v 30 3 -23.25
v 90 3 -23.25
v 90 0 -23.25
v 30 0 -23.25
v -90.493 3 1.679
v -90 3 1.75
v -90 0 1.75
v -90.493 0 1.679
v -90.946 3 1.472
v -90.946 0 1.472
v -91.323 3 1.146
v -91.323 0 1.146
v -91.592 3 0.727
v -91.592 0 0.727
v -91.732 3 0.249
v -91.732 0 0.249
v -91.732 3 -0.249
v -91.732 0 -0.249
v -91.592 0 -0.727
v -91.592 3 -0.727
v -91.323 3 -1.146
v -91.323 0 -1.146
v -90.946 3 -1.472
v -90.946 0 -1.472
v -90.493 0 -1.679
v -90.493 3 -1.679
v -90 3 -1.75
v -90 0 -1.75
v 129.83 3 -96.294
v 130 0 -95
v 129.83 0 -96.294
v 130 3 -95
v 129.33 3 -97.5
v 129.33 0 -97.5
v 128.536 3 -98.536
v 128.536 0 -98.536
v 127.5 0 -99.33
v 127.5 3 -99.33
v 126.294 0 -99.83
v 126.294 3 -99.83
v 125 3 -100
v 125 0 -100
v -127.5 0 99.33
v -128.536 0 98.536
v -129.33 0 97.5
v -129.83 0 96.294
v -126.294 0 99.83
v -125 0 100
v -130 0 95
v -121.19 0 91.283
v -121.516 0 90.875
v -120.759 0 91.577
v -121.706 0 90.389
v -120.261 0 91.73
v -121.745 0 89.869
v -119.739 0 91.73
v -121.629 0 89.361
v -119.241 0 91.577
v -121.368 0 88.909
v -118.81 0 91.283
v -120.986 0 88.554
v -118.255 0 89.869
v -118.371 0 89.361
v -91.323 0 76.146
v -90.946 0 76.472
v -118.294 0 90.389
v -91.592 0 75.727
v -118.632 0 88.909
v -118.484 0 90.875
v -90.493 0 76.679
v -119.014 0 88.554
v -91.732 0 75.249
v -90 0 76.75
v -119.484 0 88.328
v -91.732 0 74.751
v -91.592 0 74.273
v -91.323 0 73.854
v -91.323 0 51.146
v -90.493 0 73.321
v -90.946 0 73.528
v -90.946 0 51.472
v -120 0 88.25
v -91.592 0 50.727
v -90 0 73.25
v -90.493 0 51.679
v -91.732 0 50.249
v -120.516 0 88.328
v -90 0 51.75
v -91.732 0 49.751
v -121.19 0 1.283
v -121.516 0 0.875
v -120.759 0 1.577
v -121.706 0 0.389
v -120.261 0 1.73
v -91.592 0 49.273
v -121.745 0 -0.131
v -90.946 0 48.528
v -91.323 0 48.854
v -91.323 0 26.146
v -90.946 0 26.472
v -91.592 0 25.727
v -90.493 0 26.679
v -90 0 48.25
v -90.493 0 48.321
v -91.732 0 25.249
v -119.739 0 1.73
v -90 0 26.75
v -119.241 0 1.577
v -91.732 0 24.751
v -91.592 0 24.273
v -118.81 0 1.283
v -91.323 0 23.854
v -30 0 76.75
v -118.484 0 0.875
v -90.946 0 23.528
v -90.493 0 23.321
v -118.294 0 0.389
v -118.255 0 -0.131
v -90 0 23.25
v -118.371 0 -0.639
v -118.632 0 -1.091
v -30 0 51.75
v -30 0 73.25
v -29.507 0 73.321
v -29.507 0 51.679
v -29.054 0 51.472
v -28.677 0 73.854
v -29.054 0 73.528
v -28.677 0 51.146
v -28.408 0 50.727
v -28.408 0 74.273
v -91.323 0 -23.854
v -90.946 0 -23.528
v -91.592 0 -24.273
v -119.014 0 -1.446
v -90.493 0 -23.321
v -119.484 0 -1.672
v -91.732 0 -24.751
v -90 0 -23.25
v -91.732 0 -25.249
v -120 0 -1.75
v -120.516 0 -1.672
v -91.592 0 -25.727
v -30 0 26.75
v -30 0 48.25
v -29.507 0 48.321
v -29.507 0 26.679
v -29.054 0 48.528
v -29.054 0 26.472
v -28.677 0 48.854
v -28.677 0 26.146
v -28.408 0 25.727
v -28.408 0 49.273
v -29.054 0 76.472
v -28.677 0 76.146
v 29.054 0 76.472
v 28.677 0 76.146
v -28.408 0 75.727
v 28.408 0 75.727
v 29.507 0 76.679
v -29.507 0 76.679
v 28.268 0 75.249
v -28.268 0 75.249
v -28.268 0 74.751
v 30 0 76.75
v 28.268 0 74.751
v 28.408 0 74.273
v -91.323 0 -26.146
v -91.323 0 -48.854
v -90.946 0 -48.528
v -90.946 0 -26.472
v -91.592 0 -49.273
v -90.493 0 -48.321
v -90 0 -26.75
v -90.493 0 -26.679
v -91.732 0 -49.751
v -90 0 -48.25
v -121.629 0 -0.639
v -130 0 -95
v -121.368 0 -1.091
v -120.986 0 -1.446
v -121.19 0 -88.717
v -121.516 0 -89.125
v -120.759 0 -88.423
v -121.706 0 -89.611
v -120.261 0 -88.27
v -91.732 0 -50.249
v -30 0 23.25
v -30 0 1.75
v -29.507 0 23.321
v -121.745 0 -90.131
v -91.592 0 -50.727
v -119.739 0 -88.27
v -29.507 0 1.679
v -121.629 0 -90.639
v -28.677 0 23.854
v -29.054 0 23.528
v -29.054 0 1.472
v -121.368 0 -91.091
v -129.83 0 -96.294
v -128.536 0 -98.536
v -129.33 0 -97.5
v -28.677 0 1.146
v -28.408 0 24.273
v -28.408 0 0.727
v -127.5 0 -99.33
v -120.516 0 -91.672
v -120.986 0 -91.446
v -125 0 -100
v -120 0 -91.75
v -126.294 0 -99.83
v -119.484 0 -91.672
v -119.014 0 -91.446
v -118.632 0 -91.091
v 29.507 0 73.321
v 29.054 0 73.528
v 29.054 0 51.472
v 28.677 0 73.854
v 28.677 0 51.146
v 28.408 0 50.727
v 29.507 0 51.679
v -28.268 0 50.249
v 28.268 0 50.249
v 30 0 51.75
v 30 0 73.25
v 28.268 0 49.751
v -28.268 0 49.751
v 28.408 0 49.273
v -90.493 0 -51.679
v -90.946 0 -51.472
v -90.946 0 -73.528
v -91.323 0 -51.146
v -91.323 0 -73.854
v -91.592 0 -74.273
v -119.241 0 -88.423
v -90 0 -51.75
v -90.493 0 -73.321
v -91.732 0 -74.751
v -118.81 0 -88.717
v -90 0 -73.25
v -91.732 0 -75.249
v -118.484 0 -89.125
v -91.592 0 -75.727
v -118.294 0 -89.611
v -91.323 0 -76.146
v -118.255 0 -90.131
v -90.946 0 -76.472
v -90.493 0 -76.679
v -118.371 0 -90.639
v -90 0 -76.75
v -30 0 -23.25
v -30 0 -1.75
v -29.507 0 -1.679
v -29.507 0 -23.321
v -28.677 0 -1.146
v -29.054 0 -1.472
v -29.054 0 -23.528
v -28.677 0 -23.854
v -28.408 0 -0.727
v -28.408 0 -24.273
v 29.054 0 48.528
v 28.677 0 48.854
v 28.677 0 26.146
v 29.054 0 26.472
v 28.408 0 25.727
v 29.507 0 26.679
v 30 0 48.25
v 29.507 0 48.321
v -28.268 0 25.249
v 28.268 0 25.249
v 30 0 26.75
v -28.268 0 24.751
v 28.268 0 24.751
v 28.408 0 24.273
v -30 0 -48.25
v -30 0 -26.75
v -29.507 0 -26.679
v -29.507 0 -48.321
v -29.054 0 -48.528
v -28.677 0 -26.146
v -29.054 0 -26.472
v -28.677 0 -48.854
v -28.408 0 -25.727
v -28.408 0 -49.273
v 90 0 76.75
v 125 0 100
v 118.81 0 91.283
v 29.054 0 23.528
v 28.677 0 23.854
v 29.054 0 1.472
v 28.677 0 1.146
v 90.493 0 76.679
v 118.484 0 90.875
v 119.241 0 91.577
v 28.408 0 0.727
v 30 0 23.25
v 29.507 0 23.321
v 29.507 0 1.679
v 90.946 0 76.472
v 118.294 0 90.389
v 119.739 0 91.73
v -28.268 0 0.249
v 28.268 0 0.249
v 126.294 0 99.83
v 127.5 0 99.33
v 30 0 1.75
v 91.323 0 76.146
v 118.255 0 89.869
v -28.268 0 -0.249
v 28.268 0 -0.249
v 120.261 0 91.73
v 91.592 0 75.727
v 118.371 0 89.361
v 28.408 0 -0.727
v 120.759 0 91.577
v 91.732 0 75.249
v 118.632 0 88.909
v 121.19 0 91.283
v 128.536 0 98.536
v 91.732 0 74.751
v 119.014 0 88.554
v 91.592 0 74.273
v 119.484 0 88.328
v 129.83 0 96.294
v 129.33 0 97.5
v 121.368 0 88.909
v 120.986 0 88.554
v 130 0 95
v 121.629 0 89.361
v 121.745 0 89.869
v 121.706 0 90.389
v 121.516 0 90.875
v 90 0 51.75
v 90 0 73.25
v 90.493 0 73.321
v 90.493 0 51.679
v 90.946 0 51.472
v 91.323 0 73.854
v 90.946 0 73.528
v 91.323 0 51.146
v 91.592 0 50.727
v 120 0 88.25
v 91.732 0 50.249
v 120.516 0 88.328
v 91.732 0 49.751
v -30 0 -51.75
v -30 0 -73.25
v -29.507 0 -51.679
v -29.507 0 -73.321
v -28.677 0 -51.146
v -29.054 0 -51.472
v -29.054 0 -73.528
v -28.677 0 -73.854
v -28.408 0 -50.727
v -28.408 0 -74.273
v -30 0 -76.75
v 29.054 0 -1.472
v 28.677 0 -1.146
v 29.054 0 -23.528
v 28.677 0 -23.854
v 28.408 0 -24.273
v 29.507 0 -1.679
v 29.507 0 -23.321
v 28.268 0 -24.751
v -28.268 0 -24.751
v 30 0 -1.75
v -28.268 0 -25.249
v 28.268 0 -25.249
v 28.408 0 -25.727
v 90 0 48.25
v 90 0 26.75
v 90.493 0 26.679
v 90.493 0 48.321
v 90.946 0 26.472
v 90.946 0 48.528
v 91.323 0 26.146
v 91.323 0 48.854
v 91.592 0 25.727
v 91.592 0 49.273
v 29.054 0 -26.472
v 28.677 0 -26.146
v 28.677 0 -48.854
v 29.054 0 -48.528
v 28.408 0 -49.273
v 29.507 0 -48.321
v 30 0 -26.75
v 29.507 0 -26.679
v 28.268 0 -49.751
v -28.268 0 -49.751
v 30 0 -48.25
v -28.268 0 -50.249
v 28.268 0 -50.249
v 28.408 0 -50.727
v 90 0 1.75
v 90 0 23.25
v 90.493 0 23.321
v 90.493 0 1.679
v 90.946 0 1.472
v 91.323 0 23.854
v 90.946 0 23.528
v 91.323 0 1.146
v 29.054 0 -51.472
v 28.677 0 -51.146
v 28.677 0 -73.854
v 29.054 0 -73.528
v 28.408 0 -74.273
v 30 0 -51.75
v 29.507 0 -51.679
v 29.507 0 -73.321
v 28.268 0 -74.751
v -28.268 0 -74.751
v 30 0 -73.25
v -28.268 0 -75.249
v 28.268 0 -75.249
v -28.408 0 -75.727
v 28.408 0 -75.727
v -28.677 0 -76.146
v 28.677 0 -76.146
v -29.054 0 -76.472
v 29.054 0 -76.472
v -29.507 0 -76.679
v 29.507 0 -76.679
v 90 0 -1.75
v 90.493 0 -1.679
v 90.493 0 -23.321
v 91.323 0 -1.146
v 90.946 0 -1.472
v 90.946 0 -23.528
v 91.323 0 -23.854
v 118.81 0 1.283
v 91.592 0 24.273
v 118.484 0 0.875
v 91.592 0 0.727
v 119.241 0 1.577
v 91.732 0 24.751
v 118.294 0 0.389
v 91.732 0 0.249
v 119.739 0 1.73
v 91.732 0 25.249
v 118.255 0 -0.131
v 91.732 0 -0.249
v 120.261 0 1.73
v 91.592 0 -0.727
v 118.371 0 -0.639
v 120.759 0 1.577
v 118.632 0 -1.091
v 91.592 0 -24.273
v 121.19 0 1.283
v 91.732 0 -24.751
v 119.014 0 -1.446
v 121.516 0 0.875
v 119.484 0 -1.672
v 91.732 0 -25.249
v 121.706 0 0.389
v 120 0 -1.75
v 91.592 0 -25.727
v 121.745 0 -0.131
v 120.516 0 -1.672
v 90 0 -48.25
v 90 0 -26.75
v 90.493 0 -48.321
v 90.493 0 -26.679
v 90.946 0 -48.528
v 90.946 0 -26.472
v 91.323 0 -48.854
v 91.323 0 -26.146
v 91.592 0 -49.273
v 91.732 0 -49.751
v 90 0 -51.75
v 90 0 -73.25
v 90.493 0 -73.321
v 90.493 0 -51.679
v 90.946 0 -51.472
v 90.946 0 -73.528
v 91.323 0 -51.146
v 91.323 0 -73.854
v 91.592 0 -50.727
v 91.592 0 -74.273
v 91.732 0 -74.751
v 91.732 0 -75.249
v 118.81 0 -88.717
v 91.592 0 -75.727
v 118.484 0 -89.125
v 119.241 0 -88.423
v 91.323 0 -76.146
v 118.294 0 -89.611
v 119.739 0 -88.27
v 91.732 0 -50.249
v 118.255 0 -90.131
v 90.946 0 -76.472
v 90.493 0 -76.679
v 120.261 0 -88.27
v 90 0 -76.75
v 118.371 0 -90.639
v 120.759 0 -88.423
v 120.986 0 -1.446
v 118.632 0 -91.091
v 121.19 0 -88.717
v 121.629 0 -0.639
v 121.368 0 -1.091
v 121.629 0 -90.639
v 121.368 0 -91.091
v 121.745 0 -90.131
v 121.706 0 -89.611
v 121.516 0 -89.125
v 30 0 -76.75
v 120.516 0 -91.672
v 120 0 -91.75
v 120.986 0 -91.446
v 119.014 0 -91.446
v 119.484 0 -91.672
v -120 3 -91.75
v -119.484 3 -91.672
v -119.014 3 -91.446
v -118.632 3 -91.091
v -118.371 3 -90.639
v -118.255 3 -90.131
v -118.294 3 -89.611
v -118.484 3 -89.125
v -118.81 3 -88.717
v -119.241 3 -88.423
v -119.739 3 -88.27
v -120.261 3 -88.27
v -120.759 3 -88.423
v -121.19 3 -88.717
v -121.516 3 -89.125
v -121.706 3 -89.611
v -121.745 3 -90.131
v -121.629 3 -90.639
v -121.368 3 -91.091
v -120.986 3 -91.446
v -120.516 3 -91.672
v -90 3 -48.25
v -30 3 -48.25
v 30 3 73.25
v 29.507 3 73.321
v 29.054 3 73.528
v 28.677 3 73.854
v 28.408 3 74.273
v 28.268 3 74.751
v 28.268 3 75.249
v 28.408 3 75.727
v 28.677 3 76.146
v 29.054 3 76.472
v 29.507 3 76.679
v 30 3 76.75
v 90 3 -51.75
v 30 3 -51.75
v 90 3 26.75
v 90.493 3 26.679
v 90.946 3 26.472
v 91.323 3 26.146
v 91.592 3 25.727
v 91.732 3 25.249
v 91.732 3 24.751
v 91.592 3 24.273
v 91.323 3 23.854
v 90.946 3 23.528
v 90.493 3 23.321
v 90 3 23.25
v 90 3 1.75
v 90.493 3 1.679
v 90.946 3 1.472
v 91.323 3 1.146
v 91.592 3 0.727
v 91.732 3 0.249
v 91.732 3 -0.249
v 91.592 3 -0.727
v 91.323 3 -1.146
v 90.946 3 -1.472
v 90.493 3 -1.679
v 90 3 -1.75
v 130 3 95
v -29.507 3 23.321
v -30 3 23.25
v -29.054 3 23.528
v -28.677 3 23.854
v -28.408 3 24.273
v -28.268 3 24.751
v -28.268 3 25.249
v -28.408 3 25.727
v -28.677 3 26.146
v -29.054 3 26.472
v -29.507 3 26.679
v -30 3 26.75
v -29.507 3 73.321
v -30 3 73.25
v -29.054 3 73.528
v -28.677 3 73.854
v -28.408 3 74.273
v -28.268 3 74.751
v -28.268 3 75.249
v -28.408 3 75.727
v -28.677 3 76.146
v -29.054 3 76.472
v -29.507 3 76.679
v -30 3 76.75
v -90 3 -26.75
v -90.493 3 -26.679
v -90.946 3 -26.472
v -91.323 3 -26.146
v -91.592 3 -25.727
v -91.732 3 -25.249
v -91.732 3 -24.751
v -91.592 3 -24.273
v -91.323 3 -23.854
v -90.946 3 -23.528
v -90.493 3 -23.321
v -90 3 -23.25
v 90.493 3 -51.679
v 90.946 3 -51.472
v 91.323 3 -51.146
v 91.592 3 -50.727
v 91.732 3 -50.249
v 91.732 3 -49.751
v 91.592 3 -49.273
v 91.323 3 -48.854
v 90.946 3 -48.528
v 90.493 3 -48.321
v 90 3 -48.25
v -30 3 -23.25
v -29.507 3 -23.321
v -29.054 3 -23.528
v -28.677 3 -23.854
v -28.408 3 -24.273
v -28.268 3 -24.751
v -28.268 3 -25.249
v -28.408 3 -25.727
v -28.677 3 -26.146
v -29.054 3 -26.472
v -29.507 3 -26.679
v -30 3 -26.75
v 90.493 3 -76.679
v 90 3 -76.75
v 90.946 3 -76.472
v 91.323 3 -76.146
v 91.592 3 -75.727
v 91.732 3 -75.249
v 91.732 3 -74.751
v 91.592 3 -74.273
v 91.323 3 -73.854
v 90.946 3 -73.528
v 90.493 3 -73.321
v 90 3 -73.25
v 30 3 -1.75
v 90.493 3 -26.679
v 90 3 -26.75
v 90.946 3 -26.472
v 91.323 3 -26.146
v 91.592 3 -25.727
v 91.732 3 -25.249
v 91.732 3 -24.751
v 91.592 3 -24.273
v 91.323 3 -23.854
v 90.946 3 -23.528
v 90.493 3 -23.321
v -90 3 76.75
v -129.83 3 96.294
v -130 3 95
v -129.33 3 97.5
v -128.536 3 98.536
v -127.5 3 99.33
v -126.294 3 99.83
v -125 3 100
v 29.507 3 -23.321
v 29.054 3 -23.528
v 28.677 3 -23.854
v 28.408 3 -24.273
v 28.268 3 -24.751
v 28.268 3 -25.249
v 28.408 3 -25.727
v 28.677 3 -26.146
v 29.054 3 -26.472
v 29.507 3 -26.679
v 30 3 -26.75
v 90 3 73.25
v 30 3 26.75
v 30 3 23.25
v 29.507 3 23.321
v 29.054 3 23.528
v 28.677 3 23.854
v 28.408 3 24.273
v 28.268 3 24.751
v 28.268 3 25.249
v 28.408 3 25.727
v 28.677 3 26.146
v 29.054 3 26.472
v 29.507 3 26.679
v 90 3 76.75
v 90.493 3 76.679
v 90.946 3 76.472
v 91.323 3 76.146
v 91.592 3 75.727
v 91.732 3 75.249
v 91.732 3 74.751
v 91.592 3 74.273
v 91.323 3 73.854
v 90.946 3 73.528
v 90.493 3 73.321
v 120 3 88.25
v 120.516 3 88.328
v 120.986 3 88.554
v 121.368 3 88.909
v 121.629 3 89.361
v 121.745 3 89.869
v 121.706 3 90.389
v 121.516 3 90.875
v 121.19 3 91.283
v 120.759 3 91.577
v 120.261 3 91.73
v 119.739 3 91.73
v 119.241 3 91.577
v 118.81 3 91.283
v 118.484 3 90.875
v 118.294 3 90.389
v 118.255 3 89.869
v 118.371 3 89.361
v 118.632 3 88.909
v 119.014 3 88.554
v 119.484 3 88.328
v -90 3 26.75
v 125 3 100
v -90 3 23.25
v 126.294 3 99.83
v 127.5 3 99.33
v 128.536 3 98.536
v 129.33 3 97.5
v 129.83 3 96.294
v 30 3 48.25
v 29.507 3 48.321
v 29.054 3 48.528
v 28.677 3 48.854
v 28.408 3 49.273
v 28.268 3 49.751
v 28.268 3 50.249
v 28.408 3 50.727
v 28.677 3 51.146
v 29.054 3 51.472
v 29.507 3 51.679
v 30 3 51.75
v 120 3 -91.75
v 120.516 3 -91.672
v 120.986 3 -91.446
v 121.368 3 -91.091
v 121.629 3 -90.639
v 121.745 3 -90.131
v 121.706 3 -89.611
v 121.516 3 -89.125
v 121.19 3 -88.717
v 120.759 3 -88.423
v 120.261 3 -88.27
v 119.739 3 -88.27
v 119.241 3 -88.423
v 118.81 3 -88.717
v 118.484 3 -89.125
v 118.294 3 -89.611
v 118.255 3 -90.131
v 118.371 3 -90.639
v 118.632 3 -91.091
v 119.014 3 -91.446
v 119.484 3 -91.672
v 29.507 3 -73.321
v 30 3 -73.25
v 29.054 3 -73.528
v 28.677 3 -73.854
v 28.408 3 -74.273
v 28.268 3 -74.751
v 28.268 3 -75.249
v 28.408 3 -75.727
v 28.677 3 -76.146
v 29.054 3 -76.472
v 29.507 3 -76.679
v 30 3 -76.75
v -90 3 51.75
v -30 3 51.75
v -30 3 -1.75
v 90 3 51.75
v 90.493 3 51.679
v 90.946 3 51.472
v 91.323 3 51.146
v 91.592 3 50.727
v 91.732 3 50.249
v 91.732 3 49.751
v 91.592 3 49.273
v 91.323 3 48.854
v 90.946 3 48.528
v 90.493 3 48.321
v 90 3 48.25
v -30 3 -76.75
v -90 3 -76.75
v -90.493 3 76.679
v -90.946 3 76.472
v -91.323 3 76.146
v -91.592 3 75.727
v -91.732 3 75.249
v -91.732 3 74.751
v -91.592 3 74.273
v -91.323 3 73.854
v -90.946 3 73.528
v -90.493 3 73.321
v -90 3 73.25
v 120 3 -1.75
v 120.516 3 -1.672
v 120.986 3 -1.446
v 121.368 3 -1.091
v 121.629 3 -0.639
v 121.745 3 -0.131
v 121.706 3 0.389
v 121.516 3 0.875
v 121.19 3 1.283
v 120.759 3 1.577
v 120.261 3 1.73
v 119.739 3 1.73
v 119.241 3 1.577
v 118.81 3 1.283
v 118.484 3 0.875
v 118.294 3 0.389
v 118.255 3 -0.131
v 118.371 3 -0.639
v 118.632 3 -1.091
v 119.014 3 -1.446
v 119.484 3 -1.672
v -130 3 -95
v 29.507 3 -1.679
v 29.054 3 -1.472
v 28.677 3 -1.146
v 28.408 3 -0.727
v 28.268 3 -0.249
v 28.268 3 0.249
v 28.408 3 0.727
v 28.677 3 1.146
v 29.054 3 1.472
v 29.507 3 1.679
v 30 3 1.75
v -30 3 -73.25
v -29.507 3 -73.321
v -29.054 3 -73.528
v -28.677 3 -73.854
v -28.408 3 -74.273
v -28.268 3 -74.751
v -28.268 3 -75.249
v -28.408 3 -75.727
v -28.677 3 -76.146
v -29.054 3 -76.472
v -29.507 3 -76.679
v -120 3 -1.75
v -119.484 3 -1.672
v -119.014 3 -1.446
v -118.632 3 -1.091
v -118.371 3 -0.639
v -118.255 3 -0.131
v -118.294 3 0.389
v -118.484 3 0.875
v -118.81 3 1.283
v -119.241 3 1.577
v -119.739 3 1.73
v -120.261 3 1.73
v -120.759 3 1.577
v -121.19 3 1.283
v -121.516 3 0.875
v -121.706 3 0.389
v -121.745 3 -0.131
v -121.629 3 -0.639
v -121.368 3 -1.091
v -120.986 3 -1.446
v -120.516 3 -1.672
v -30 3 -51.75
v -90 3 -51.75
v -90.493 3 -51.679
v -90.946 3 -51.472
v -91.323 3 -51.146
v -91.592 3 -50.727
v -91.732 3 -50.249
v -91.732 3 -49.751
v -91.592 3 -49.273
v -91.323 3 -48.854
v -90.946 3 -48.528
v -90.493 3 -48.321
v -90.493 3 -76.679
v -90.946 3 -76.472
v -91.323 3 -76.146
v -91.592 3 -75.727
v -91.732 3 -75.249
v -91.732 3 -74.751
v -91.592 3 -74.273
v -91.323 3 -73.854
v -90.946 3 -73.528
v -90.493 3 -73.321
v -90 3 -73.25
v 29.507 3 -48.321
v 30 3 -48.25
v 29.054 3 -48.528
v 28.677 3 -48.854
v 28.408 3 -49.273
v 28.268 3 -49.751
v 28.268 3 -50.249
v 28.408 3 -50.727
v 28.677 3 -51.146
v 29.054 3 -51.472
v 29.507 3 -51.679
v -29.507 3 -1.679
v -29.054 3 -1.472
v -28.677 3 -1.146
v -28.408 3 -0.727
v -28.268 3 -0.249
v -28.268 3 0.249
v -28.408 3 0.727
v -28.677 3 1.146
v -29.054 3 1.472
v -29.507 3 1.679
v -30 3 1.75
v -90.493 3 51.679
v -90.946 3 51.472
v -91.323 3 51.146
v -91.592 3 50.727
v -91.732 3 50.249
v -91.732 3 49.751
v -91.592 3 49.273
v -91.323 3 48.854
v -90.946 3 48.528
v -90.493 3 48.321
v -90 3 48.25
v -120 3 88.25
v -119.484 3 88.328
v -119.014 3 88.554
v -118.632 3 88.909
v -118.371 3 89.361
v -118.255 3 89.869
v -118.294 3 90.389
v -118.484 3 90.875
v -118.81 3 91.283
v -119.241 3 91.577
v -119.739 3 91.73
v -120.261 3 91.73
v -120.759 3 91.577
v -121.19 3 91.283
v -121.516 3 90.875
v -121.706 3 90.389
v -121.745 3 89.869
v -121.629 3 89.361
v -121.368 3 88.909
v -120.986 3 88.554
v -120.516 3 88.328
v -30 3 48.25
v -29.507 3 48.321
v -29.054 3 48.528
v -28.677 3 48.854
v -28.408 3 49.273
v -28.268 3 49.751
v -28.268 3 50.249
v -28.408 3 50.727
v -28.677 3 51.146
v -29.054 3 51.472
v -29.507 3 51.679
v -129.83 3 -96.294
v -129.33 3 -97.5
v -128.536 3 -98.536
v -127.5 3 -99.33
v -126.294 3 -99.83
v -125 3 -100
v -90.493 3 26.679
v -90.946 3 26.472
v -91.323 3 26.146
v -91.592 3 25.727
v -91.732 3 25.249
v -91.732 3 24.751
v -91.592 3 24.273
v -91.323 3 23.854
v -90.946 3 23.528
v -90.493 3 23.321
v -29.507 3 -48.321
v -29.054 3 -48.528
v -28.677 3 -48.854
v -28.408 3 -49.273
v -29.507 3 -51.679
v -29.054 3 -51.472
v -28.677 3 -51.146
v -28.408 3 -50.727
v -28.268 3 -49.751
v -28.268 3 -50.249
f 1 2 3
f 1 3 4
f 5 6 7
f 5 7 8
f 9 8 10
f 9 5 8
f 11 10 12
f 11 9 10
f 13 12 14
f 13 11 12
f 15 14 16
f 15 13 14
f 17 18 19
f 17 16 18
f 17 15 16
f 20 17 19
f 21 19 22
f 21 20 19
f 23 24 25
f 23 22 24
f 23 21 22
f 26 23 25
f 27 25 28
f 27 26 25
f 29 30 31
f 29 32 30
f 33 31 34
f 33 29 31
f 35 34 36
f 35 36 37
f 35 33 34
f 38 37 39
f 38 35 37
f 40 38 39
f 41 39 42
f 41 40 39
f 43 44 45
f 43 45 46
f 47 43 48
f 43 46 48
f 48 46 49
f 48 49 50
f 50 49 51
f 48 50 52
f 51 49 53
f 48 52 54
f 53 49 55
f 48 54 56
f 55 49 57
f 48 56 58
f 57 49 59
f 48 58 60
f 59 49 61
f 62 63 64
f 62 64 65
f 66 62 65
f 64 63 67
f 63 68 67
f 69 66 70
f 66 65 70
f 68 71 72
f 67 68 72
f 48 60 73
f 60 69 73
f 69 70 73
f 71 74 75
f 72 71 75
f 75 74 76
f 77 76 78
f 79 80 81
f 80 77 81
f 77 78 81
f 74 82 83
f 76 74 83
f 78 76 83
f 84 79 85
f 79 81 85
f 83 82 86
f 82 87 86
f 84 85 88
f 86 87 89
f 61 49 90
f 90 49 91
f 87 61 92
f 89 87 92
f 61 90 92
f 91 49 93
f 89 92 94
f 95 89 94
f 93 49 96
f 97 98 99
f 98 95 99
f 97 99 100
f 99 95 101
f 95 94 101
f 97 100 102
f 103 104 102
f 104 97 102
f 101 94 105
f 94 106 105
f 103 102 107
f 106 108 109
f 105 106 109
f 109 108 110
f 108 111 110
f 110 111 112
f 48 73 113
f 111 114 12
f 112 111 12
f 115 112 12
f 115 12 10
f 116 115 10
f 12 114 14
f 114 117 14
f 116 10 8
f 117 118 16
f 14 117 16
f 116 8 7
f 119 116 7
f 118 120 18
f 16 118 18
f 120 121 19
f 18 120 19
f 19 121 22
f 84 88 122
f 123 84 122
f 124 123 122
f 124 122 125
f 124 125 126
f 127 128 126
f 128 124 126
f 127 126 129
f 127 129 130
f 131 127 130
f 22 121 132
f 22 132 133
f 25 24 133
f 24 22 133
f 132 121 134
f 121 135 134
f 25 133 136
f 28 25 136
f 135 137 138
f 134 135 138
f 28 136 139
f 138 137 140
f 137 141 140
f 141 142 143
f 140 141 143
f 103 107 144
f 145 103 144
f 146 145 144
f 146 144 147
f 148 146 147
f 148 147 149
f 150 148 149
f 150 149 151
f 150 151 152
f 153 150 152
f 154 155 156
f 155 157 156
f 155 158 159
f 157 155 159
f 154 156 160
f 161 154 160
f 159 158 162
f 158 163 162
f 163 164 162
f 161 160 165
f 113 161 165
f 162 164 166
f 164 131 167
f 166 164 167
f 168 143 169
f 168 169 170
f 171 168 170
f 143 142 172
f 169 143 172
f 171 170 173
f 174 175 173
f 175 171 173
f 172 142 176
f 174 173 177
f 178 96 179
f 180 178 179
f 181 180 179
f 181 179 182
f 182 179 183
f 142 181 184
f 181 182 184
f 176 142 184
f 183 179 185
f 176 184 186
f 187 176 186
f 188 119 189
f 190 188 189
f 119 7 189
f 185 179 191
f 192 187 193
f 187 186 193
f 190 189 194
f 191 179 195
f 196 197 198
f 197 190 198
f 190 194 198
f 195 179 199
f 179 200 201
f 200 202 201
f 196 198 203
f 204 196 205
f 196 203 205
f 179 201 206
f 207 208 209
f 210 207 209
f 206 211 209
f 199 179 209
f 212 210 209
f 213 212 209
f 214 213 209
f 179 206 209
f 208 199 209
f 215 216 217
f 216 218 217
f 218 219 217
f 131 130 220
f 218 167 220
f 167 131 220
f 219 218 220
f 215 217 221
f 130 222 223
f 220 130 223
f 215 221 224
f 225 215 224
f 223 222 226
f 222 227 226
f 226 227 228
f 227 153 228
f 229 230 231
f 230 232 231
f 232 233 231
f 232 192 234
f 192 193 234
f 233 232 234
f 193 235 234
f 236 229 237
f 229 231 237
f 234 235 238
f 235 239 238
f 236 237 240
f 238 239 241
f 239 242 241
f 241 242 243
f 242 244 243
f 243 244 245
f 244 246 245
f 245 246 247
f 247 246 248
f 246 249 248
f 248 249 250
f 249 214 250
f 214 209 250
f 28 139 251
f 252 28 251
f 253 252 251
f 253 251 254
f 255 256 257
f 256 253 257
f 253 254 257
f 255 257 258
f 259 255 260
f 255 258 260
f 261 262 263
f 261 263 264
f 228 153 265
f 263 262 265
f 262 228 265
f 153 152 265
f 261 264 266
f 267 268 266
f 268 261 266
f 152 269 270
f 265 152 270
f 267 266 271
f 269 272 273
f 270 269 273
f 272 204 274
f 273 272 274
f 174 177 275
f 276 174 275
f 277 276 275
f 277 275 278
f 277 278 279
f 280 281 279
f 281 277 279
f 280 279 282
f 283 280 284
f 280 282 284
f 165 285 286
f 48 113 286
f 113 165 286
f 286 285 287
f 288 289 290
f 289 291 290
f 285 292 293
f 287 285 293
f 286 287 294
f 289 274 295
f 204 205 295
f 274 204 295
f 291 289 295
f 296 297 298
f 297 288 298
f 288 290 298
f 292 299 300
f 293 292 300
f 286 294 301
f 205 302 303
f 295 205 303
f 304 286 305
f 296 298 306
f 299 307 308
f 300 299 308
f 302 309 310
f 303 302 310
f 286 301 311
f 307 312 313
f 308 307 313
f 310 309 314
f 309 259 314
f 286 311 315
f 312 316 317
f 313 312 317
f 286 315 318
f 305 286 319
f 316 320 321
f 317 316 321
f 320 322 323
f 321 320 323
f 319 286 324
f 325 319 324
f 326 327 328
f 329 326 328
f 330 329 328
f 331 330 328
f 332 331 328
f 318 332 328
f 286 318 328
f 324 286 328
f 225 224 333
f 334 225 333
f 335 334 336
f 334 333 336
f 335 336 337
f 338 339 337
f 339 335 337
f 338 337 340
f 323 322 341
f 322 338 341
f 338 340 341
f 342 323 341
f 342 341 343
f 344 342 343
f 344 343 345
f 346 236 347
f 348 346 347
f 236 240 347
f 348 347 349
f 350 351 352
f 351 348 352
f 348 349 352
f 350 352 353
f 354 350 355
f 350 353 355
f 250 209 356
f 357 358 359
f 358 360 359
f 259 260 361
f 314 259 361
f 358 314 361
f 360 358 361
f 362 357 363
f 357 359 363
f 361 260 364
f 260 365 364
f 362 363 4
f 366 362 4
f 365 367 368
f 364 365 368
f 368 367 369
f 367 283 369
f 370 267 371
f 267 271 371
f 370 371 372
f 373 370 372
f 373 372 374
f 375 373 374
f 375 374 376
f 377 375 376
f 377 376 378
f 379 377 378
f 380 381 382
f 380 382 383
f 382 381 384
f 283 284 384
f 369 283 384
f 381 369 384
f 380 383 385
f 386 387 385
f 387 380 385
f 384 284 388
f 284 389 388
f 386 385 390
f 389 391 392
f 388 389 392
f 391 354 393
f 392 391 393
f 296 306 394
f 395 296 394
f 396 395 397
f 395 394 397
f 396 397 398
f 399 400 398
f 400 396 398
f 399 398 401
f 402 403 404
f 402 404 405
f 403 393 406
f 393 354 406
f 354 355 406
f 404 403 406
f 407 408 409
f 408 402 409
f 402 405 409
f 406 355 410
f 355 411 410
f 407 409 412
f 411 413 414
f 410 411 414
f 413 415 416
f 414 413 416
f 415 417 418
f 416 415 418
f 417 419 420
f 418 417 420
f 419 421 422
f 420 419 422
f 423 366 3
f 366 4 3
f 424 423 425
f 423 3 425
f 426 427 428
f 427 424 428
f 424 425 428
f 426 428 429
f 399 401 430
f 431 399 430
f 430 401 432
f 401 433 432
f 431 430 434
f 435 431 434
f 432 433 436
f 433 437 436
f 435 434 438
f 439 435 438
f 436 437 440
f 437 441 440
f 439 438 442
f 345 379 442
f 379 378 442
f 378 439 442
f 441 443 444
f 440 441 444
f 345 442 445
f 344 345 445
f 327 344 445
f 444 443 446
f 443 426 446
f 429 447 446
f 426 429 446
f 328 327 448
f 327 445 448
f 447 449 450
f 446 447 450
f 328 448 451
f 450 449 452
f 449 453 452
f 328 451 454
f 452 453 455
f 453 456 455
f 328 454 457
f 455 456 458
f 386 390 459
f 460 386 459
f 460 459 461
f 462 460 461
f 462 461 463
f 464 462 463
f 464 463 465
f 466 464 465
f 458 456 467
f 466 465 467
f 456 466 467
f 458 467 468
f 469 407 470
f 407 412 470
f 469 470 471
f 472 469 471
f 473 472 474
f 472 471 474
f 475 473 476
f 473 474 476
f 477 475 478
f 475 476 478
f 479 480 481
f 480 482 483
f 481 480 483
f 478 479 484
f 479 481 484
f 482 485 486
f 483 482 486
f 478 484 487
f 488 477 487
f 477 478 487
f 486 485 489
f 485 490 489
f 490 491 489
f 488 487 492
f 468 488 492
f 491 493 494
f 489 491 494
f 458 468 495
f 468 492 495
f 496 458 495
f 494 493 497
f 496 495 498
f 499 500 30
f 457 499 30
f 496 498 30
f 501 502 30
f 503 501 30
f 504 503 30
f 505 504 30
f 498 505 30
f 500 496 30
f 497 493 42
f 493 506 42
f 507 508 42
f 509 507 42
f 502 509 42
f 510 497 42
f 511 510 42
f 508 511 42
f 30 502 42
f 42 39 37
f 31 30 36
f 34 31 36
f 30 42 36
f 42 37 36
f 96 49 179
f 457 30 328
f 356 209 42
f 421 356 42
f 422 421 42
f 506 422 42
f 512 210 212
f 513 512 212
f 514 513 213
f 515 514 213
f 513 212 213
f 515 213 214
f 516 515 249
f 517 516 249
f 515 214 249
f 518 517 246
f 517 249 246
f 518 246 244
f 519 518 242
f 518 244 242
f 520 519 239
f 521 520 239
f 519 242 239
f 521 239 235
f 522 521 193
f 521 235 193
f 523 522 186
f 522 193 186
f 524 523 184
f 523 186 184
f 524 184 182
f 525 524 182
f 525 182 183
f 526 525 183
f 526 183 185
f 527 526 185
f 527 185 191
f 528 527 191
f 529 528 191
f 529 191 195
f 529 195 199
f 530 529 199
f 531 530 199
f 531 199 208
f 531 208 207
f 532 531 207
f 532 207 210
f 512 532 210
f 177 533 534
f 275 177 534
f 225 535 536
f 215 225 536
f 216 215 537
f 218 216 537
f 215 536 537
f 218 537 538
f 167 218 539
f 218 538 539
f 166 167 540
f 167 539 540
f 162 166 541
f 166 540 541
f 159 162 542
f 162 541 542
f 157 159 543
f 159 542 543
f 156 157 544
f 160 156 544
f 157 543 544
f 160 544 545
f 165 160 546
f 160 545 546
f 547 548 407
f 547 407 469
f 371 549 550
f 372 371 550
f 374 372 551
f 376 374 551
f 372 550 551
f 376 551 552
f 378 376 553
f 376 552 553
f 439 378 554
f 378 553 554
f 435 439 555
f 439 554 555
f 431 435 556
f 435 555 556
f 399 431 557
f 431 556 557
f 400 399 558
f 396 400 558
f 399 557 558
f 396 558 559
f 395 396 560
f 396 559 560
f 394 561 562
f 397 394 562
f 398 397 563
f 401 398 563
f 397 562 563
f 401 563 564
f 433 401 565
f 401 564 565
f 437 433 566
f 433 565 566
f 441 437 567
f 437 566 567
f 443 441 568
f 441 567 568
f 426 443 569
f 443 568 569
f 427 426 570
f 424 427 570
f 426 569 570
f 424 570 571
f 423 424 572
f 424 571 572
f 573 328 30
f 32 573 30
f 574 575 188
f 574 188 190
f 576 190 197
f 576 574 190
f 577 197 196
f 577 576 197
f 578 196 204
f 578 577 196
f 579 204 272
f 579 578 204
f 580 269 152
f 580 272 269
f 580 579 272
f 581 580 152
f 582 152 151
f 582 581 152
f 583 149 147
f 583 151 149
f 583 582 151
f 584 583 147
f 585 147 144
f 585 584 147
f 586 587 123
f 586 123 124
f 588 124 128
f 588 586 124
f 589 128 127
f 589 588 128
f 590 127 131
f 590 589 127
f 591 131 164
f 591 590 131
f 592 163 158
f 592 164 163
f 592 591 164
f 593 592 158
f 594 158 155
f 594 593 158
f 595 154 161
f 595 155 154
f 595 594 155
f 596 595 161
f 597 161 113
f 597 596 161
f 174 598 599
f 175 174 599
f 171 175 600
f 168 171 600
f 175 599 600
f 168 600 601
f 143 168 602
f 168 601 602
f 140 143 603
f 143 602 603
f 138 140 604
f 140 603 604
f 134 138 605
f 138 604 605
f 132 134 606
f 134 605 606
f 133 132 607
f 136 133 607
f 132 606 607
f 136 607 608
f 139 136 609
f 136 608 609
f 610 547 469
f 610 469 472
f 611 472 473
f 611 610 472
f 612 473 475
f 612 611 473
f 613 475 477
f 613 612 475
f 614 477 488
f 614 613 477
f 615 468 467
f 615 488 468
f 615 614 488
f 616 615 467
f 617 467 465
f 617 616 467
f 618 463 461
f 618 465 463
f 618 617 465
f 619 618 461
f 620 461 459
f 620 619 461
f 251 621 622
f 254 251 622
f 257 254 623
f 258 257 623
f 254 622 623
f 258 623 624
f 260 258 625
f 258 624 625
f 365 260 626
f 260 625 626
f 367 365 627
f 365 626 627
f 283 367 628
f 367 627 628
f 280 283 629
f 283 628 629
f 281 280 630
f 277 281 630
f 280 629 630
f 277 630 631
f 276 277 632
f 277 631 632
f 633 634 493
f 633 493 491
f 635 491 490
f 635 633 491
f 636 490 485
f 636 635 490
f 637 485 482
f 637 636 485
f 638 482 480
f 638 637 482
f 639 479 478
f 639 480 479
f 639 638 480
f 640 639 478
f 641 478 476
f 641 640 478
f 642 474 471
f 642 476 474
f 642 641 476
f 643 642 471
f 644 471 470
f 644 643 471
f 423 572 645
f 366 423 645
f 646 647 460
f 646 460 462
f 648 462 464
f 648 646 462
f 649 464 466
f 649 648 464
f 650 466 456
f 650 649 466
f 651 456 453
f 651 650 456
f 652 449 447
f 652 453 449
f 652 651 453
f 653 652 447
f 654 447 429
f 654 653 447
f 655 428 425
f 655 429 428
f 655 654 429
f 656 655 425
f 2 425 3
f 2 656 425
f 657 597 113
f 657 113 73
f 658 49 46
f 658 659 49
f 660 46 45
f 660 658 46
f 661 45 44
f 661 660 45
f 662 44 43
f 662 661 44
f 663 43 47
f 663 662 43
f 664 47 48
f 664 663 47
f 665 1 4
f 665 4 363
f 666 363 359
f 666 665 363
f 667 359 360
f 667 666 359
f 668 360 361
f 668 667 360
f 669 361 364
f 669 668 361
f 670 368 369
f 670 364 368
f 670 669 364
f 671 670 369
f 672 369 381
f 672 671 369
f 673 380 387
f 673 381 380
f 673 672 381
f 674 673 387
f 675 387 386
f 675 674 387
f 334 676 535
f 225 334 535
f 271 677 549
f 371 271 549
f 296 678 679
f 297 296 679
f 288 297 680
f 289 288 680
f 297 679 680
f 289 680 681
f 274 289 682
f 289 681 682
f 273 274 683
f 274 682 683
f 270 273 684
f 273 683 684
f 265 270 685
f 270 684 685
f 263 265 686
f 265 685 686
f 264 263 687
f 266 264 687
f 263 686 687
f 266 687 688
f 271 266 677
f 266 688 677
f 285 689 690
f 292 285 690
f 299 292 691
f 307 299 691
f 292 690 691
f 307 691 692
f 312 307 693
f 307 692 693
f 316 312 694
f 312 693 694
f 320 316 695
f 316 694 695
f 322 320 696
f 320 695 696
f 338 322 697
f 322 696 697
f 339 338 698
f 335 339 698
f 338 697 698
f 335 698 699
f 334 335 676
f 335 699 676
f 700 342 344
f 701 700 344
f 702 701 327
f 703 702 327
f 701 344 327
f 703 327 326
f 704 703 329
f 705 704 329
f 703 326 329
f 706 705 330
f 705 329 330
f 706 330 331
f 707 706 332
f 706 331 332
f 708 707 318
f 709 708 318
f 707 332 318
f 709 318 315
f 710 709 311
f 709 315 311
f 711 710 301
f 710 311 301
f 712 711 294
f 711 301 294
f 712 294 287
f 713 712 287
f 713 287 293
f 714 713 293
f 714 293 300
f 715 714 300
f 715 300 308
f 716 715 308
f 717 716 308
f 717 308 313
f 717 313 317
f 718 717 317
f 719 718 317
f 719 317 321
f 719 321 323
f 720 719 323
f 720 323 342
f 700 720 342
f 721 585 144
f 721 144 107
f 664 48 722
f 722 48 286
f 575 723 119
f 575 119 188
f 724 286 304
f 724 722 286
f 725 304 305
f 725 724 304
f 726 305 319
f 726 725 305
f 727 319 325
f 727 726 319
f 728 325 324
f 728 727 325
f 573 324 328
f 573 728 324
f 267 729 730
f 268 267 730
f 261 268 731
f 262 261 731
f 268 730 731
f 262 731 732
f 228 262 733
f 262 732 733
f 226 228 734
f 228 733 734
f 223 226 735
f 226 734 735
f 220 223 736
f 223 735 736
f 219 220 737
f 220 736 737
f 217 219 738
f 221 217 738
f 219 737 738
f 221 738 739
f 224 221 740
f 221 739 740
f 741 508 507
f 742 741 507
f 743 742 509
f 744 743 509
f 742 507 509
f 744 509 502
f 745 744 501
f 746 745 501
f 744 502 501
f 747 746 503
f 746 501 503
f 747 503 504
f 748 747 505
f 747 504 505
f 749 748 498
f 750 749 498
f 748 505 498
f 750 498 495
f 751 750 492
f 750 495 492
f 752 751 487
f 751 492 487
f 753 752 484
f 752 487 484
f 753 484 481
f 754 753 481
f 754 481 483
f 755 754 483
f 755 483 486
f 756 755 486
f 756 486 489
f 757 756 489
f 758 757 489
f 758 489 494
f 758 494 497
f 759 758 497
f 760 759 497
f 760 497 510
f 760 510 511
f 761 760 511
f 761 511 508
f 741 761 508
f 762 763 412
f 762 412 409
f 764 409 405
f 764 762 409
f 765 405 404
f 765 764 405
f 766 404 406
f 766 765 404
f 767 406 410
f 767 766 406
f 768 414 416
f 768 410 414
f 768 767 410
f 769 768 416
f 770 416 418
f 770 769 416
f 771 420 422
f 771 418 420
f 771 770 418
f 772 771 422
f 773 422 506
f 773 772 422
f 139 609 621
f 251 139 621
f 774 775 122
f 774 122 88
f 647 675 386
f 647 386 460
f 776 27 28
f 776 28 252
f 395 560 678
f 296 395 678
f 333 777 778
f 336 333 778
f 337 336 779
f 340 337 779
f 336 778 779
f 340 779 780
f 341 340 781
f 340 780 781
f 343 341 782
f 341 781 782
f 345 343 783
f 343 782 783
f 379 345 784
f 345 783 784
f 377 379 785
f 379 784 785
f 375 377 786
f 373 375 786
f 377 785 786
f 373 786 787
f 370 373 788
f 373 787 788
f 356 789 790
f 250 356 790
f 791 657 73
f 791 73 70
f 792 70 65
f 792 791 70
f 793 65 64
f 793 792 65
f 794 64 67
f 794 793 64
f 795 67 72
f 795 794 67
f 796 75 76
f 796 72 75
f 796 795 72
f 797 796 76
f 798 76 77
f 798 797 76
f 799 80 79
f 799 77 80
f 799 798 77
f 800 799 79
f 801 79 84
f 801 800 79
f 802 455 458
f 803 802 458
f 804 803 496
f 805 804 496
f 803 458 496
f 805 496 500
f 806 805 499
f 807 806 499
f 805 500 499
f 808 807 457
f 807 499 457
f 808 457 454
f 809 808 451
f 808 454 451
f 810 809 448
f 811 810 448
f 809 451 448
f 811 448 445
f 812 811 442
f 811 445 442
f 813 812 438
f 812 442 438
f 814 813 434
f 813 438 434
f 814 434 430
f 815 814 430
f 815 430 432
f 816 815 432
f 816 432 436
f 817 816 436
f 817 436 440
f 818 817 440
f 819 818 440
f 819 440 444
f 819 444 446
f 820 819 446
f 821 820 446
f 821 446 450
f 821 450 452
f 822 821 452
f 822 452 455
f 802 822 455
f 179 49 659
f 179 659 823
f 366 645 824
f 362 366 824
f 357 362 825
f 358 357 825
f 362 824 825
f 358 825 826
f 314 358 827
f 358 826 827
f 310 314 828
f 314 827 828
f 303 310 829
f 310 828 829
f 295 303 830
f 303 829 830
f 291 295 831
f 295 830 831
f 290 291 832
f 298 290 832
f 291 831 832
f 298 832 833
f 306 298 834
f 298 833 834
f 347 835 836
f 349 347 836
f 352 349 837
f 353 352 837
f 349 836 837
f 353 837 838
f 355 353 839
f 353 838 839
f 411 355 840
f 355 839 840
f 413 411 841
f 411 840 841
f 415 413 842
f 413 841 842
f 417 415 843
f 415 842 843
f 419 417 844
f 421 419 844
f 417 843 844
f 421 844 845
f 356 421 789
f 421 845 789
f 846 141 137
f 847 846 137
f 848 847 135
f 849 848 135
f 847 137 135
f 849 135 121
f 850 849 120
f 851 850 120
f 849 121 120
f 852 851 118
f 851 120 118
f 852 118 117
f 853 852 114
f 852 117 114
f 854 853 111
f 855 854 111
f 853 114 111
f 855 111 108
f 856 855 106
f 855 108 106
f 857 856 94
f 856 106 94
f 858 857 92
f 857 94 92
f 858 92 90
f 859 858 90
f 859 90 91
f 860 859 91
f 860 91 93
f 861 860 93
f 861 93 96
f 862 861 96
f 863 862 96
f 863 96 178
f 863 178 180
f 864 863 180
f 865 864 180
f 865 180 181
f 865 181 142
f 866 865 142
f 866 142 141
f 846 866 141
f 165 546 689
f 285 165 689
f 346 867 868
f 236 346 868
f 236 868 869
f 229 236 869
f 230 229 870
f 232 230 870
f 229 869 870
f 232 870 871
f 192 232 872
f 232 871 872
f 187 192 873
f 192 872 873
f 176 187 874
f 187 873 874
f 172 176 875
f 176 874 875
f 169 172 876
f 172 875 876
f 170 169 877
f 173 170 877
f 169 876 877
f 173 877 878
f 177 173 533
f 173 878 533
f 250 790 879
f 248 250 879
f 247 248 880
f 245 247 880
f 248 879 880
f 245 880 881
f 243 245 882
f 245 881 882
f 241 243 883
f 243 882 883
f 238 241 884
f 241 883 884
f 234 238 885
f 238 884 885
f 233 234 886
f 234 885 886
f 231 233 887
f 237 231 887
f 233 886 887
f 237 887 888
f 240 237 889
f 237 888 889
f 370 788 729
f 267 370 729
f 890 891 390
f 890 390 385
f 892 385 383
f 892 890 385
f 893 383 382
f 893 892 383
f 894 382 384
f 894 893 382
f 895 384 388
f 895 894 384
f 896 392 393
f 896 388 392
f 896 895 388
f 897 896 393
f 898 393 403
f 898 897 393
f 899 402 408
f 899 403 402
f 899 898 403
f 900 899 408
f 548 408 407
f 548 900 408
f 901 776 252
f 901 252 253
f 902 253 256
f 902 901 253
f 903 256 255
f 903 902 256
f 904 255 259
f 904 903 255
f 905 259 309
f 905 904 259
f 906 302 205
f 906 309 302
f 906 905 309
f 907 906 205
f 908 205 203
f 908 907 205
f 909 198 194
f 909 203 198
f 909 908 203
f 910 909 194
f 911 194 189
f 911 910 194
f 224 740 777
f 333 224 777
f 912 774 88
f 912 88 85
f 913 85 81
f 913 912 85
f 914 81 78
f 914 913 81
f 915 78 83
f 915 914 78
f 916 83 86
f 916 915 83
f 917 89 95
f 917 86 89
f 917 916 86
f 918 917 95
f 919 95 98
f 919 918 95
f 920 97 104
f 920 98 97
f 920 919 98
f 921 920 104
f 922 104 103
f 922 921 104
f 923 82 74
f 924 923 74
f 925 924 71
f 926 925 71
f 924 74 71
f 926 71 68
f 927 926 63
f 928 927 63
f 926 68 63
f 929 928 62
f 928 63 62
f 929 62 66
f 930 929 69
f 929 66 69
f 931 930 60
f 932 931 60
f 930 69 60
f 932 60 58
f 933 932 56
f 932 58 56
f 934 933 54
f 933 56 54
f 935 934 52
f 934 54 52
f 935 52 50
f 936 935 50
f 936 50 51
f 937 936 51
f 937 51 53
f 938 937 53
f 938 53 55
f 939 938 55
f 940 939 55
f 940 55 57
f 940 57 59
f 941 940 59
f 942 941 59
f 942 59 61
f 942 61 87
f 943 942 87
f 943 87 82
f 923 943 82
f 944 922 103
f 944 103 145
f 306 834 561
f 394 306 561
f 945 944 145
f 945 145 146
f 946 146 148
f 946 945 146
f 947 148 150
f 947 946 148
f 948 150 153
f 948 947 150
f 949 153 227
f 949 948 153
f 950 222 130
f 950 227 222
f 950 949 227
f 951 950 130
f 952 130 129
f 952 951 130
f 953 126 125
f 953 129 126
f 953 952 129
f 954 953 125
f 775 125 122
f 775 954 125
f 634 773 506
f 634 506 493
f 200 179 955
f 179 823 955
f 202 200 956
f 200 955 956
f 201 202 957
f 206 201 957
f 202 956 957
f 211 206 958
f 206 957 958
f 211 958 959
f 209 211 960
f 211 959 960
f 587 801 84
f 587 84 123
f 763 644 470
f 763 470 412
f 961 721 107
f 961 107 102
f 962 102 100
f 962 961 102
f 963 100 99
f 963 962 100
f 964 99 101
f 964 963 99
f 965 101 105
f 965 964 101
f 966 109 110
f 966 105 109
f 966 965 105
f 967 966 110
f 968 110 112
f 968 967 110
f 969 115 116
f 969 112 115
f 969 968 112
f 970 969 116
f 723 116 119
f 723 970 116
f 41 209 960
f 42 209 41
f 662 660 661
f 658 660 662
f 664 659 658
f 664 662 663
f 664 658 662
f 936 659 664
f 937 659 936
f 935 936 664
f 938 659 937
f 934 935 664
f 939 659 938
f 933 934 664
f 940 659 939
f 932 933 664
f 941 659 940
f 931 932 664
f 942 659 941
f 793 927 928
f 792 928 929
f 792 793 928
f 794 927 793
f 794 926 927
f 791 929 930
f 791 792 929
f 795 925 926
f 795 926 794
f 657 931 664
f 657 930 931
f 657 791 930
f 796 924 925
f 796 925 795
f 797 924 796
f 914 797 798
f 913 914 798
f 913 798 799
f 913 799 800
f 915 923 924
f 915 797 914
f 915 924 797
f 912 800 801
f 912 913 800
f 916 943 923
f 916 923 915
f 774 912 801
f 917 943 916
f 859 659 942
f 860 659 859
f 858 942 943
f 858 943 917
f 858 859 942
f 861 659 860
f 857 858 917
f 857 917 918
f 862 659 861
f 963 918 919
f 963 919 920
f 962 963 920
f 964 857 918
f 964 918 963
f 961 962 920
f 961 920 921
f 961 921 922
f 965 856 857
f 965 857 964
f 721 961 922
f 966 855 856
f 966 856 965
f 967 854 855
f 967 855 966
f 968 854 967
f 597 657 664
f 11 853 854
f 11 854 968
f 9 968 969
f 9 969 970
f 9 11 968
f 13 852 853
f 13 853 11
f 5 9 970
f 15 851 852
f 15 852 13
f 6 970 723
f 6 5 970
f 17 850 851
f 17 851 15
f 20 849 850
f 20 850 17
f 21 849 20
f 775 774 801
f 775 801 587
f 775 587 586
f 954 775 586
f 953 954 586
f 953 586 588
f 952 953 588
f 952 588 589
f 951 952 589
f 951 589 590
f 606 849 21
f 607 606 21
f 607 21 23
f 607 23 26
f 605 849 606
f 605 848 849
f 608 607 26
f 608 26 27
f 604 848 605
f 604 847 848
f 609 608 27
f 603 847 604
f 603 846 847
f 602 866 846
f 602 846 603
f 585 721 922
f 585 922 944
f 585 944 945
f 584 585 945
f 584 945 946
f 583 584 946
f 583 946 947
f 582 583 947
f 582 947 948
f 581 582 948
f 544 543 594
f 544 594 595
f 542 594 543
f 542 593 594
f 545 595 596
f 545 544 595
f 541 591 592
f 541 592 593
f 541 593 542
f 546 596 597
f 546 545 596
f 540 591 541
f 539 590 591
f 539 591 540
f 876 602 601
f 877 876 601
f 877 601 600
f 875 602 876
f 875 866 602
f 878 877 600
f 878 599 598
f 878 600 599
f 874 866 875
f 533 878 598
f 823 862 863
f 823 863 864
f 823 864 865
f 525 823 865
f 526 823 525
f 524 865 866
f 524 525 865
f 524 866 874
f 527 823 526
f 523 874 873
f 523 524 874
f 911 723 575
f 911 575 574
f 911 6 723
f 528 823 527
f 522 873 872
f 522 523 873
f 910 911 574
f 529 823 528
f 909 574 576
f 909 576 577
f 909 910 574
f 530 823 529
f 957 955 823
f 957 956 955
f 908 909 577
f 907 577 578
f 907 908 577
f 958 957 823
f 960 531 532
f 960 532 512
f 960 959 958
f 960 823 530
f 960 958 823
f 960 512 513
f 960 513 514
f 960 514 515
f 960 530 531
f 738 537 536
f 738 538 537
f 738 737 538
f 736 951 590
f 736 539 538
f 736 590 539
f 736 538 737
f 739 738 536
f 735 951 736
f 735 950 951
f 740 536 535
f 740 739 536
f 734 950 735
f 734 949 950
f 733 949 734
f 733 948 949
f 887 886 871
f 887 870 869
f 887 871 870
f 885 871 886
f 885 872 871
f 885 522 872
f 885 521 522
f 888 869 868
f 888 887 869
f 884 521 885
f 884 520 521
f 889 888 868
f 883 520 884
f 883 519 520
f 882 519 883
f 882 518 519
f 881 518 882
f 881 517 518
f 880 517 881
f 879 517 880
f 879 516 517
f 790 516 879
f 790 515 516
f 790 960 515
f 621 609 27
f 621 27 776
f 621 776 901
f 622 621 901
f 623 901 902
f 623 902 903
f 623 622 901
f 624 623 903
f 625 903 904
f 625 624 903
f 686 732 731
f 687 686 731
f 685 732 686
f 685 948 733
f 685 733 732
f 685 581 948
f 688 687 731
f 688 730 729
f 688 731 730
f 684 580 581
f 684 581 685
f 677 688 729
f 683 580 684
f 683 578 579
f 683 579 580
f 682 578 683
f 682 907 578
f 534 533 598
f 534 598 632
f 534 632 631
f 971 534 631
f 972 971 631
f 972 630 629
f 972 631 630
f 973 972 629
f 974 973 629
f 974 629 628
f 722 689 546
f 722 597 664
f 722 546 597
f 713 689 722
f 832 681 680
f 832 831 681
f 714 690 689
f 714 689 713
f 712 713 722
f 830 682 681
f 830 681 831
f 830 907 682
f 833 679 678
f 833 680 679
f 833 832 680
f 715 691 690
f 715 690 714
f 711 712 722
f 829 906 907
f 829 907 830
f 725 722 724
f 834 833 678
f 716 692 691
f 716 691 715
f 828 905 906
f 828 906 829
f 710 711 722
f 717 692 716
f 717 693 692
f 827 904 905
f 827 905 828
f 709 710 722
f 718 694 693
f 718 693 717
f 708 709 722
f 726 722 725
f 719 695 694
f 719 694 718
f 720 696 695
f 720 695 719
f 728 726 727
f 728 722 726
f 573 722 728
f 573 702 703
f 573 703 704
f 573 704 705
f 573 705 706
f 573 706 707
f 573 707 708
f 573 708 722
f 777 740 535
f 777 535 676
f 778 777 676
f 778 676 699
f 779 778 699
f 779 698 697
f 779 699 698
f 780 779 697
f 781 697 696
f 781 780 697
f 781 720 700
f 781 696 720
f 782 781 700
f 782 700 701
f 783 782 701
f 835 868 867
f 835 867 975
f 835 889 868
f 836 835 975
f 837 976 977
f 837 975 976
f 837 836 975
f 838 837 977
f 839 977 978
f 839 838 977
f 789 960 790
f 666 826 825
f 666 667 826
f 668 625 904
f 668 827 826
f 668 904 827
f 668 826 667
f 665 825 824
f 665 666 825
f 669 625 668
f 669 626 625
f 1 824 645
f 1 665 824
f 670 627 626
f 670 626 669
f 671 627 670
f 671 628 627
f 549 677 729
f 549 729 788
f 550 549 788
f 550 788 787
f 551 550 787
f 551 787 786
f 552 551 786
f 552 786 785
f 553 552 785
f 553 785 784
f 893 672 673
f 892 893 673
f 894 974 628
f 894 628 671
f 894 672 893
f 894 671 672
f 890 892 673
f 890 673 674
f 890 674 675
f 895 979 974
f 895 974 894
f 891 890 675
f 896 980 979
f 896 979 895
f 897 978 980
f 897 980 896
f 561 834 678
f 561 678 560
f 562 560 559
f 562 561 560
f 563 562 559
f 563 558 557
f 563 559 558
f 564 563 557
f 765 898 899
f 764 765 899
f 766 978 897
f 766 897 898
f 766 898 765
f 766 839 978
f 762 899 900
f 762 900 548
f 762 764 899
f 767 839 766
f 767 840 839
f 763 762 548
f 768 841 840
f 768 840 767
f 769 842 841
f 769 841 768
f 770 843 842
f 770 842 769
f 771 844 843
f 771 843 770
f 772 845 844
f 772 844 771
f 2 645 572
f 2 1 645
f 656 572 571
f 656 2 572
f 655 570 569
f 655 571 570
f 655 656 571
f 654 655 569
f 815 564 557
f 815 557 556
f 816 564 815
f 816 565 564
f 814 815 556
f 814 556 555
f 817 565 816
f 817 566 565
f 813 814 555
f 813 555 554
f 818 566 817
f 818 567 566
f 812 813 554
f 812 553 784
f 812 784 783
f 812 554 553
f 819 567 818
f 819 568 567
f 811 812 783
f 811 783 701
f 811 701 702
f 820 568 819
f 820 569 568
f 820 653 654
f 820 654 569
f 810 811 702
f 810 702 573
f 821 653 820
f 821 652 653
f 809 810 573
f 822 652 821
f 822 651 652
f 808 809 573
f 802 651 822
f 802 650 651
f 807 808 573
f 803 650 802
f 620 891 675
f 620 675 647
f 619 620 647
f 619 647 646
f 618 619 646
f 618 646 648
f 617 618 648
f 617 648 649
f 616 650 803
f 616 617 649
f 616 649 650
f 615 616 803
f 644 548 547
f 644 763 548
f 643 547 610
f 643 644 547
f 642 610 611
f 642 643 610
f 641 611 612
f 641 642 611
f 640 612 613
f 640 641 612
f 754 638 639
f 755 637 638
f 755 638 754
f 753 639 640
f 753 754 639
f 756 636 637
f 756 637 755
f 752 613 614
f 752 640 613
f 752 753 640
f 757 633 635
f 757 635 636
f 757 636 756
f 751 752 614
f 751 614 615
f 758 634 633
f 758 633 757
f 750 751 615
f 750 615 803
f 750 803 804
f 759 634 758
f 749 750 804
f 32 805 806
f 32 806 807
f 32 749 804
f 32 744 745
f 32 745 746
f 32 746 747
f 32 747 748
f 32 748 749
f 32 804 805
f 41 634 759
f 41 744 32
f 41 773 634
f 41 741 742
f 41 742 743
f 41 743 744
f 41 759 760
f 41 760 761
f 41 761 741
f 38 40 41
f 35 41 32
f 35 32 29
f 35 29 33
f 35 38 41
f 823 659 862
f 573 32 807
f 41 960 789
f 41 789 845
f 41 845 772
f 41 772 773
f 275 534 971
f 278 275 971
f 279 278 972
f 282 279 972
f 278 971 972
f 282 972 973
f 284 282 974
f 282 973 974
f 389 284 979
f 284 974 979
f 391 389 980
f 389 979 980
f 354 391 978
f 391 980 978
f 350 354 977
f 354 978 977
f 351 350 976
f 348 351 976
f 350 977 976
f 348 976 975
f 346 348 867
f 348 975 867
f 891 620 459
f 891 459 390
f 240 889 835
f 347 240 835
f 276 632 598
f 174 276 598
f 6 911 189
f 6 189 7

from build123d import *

# Parameters (mm, degrees)
SKETCH_1_W          = 260
SKETCH_1_H          = 200
EXTRUDE_1_DEPTH     = 3
FILLET_1_R          = 5
SKETCH_2_R          = 1.75
CUT_EXTRUDE_1_DEPTH = 10
CUT_EXTRUDE_2_DEPTH = 10


with BuildPart() as part:
    # 草图1 → 凸台-拉伸1 (new body)
    with BuildSketch(Plane(origin=(0, 0, 0), x_dir=(1, 0, 0), z_dir=(0, 1, 0))):
        Rectangle(SKETCH_1_W, SKETCH_1_H)
    extrude(amount=EXTRUDE_1_DEPTH)

    # 圆角1
    fillet_1_edges = [part.edges().sort_by_distance(p)[0] for p in [
        (130, 1.5, 100),
        (-130, 1.5, 100),
        (-130, 1.5, -100),
        (130, 1.5, -100),
    ]]
    fillet(fillet_1_edges, radius=FILLET_1_R)

    # 草图2 → 切除-拉伸1 (cut)
    with BuildSketch(Plane.XZ):
        with Locations(Location((120, 90, 0), (0, 0, 270))):
            Circle(SKETCH_2_R)
        with Locations(Location((120, -90, 0), (0, 0, 270))):
            Circle(SKETCH_2_R)
        with Locations(Location((-120, -90, 0), (0, 0, 270))):
            Circle(SKETCH_2_R)
        with Locations(Location((-120, 90, 0), (0, 0, 270))):
            Circle(SKETCH_2_R)
        with Locations(Location((-120, 0, 0), (0, 0, 270))):
            Circle(SKETCH_2_R)
        with Locations(Location((120, 0, 0), (0, 0, 270))):
            Circle(SKETCH_2_R)
    extrude(amount=-CUT_EXTRUDE_1_DEPTH, mode=Mode.SUBTRACT)

    # 草图3 → 切除-拉伸2 (cut)
    with BuildSketch(Plane(origin=(0, 3, 0), x_dir=(1, 0, 0), z_dir=(0, 1, 0))):
        with BuildLine():
            Line((-90, -73.25), (-30, -73.25))
            ThreePointArc((-30, -73.25), (-28.25, -75), (-30, -76.75))
            Line((-30, -76.75), (-90, -76.75))
            ThreePointArc((-90, -76.75), (-91.75, -75), (-90, -73.25))
        make_face()
        with BuildLine():
            Line((-90, -48.25), (-30, -48.25))
            ThreePointArc((-30, -48.25), (-28.25, -50), (-30, -51.75))
            Line((-30, -51.75), (-90, -51.75))
            ThreePointArc((-90, -51.75), (-91.75, -50), (-90, -48.25))
        make_face()
        with BuildLine():
            Line((-90, -23.25), (-30, -23.25))
            ThreePointArc((-30, -23.25), (-28.25, -25), (-30, -26.75))
            Line((-30, -26.75), (-90, -26.75))
            ThreePointArc((-90, -26.75), (-91.75, -25), (-90, -23.25))
        make_face()
        with BuildLine():
            Line((-90, 1.75), (-30, 1.75))
            ThreePointArc((-30, 1.75), (-28.25, 0), (-30, -1.75))
            Line((-30, -1.75), (-90, -1.75))
            ThreePointArc((-90, -1.75), (-91.75, 0), (-90, 1.75))
        make_face()
        with BuildLine():
            Line((-90, 23.25), (-30, 23.25))
            ThreePointArc((-30, 23.25), (-28.25, 25), (-30, 26.75))
            Line((-30, 26.75), (-90, 26.75))
            ThreePointArc((-90, 26.75), (-91.75, 25), (-90, 23.25))
        make_face()
        with BuildLine():
            Line((-90, 48.25), (-30, 48.25))
            ThreePointArc((-30, 48.25), (-28.25, 50), (-30, 51.75))
            Line((-30, 51.75), (-90, 51.75))
            ThreePointArc((-90, 51.75), (-91.75, 50), (-90, 48.25))
        make_face()
        with BuildLine():
            Line((-90, 73.25), (-30, 73.25))
            ThreePointArc((-30, 73.25), (-28.25, 75), (-30, 76.75))
            Line((-30, 76.75), (-90, 76.75))
            ThreePointArc((-90, 76.75), (-91.75, 75), (-90, 73.25))
        make_face()
        with BuildLine():
            Line((90, 73.25), (30, 73.25))
            ThreePointArc((30, 73.25), (28.25, 75), (30, 76.75))
            Line((30, 76.75), (90, 76.75))
            ThreePointArc((90, 76.75), (91.75, 75), (90, 73.25))
        make_face()
        with BuildLine():
            Line((90, 48.25), (30, 48.25))
            ThreePointArc((30, 48.25), (28.25, 50), (30, 51.75))
            Line((30, 51.75), (90, 51.75))
            ThreePointArc((90, 51.75), (91.75, 50), (90, 48.25))
        make_face()
        with BuildLine():
            Line((90, 23.25), (30, 23.25))
            ThreePointArc((30, 23.25), (28.25, 25), (30, 26.75))
            Line((30, 26.75), (90, 26.75))
            ThreePointArc((90, 26.75), (91.75, 25), (90, 23.25))
        make_face()
        with BuildLine():
            Line((90, 1.75), (30, 1.75))
            ThreePointArc((30, 1.75), (28.25, 0), (30, -1.75))
            Line((30, -1.75), (90, -1.75))
            ThreePointArc((90, -1.75), (91.75, 0), (90, 1.75))
        make_face()
        with BuildLine():
            Line((90, -23.25), (30, -23.25))
            ThreePointArc((30, -23.25), (28.25, -25), (30, -26.75))
            Line((30, -26.75), (90, -26.75))
            ThreePointArc((90, -26.75), (91.75, -25), (90, -23.25))
        make_face()
        with BuildLine():
            Line((90, -48.25), (30, -48.25))
            ThreePointArc((30, -48.25), (28.25, -50), (30, -51.75))
            Line((30, -51.75), (90, -51.75))
            ThreePointArc((90, -51.75), (91.75, -50), (90, -48.25))
        make_face()
        with BuildLine():
            Line((90, -73.25), (30, -73.25))
            ThreePointArc((30, -73.25), (28.25, -75), (30, -76.75))
            Line((30, -76.75), (90, -76.75))
            ThreePointArc((90, -76.75), (91.75, -75), (90, -73.25))
        make_face()
    extrude(amount=-CUT_EXTRUDE_2_DEPTH, mode=Mode.SUBTRACT)


solid = part.part
